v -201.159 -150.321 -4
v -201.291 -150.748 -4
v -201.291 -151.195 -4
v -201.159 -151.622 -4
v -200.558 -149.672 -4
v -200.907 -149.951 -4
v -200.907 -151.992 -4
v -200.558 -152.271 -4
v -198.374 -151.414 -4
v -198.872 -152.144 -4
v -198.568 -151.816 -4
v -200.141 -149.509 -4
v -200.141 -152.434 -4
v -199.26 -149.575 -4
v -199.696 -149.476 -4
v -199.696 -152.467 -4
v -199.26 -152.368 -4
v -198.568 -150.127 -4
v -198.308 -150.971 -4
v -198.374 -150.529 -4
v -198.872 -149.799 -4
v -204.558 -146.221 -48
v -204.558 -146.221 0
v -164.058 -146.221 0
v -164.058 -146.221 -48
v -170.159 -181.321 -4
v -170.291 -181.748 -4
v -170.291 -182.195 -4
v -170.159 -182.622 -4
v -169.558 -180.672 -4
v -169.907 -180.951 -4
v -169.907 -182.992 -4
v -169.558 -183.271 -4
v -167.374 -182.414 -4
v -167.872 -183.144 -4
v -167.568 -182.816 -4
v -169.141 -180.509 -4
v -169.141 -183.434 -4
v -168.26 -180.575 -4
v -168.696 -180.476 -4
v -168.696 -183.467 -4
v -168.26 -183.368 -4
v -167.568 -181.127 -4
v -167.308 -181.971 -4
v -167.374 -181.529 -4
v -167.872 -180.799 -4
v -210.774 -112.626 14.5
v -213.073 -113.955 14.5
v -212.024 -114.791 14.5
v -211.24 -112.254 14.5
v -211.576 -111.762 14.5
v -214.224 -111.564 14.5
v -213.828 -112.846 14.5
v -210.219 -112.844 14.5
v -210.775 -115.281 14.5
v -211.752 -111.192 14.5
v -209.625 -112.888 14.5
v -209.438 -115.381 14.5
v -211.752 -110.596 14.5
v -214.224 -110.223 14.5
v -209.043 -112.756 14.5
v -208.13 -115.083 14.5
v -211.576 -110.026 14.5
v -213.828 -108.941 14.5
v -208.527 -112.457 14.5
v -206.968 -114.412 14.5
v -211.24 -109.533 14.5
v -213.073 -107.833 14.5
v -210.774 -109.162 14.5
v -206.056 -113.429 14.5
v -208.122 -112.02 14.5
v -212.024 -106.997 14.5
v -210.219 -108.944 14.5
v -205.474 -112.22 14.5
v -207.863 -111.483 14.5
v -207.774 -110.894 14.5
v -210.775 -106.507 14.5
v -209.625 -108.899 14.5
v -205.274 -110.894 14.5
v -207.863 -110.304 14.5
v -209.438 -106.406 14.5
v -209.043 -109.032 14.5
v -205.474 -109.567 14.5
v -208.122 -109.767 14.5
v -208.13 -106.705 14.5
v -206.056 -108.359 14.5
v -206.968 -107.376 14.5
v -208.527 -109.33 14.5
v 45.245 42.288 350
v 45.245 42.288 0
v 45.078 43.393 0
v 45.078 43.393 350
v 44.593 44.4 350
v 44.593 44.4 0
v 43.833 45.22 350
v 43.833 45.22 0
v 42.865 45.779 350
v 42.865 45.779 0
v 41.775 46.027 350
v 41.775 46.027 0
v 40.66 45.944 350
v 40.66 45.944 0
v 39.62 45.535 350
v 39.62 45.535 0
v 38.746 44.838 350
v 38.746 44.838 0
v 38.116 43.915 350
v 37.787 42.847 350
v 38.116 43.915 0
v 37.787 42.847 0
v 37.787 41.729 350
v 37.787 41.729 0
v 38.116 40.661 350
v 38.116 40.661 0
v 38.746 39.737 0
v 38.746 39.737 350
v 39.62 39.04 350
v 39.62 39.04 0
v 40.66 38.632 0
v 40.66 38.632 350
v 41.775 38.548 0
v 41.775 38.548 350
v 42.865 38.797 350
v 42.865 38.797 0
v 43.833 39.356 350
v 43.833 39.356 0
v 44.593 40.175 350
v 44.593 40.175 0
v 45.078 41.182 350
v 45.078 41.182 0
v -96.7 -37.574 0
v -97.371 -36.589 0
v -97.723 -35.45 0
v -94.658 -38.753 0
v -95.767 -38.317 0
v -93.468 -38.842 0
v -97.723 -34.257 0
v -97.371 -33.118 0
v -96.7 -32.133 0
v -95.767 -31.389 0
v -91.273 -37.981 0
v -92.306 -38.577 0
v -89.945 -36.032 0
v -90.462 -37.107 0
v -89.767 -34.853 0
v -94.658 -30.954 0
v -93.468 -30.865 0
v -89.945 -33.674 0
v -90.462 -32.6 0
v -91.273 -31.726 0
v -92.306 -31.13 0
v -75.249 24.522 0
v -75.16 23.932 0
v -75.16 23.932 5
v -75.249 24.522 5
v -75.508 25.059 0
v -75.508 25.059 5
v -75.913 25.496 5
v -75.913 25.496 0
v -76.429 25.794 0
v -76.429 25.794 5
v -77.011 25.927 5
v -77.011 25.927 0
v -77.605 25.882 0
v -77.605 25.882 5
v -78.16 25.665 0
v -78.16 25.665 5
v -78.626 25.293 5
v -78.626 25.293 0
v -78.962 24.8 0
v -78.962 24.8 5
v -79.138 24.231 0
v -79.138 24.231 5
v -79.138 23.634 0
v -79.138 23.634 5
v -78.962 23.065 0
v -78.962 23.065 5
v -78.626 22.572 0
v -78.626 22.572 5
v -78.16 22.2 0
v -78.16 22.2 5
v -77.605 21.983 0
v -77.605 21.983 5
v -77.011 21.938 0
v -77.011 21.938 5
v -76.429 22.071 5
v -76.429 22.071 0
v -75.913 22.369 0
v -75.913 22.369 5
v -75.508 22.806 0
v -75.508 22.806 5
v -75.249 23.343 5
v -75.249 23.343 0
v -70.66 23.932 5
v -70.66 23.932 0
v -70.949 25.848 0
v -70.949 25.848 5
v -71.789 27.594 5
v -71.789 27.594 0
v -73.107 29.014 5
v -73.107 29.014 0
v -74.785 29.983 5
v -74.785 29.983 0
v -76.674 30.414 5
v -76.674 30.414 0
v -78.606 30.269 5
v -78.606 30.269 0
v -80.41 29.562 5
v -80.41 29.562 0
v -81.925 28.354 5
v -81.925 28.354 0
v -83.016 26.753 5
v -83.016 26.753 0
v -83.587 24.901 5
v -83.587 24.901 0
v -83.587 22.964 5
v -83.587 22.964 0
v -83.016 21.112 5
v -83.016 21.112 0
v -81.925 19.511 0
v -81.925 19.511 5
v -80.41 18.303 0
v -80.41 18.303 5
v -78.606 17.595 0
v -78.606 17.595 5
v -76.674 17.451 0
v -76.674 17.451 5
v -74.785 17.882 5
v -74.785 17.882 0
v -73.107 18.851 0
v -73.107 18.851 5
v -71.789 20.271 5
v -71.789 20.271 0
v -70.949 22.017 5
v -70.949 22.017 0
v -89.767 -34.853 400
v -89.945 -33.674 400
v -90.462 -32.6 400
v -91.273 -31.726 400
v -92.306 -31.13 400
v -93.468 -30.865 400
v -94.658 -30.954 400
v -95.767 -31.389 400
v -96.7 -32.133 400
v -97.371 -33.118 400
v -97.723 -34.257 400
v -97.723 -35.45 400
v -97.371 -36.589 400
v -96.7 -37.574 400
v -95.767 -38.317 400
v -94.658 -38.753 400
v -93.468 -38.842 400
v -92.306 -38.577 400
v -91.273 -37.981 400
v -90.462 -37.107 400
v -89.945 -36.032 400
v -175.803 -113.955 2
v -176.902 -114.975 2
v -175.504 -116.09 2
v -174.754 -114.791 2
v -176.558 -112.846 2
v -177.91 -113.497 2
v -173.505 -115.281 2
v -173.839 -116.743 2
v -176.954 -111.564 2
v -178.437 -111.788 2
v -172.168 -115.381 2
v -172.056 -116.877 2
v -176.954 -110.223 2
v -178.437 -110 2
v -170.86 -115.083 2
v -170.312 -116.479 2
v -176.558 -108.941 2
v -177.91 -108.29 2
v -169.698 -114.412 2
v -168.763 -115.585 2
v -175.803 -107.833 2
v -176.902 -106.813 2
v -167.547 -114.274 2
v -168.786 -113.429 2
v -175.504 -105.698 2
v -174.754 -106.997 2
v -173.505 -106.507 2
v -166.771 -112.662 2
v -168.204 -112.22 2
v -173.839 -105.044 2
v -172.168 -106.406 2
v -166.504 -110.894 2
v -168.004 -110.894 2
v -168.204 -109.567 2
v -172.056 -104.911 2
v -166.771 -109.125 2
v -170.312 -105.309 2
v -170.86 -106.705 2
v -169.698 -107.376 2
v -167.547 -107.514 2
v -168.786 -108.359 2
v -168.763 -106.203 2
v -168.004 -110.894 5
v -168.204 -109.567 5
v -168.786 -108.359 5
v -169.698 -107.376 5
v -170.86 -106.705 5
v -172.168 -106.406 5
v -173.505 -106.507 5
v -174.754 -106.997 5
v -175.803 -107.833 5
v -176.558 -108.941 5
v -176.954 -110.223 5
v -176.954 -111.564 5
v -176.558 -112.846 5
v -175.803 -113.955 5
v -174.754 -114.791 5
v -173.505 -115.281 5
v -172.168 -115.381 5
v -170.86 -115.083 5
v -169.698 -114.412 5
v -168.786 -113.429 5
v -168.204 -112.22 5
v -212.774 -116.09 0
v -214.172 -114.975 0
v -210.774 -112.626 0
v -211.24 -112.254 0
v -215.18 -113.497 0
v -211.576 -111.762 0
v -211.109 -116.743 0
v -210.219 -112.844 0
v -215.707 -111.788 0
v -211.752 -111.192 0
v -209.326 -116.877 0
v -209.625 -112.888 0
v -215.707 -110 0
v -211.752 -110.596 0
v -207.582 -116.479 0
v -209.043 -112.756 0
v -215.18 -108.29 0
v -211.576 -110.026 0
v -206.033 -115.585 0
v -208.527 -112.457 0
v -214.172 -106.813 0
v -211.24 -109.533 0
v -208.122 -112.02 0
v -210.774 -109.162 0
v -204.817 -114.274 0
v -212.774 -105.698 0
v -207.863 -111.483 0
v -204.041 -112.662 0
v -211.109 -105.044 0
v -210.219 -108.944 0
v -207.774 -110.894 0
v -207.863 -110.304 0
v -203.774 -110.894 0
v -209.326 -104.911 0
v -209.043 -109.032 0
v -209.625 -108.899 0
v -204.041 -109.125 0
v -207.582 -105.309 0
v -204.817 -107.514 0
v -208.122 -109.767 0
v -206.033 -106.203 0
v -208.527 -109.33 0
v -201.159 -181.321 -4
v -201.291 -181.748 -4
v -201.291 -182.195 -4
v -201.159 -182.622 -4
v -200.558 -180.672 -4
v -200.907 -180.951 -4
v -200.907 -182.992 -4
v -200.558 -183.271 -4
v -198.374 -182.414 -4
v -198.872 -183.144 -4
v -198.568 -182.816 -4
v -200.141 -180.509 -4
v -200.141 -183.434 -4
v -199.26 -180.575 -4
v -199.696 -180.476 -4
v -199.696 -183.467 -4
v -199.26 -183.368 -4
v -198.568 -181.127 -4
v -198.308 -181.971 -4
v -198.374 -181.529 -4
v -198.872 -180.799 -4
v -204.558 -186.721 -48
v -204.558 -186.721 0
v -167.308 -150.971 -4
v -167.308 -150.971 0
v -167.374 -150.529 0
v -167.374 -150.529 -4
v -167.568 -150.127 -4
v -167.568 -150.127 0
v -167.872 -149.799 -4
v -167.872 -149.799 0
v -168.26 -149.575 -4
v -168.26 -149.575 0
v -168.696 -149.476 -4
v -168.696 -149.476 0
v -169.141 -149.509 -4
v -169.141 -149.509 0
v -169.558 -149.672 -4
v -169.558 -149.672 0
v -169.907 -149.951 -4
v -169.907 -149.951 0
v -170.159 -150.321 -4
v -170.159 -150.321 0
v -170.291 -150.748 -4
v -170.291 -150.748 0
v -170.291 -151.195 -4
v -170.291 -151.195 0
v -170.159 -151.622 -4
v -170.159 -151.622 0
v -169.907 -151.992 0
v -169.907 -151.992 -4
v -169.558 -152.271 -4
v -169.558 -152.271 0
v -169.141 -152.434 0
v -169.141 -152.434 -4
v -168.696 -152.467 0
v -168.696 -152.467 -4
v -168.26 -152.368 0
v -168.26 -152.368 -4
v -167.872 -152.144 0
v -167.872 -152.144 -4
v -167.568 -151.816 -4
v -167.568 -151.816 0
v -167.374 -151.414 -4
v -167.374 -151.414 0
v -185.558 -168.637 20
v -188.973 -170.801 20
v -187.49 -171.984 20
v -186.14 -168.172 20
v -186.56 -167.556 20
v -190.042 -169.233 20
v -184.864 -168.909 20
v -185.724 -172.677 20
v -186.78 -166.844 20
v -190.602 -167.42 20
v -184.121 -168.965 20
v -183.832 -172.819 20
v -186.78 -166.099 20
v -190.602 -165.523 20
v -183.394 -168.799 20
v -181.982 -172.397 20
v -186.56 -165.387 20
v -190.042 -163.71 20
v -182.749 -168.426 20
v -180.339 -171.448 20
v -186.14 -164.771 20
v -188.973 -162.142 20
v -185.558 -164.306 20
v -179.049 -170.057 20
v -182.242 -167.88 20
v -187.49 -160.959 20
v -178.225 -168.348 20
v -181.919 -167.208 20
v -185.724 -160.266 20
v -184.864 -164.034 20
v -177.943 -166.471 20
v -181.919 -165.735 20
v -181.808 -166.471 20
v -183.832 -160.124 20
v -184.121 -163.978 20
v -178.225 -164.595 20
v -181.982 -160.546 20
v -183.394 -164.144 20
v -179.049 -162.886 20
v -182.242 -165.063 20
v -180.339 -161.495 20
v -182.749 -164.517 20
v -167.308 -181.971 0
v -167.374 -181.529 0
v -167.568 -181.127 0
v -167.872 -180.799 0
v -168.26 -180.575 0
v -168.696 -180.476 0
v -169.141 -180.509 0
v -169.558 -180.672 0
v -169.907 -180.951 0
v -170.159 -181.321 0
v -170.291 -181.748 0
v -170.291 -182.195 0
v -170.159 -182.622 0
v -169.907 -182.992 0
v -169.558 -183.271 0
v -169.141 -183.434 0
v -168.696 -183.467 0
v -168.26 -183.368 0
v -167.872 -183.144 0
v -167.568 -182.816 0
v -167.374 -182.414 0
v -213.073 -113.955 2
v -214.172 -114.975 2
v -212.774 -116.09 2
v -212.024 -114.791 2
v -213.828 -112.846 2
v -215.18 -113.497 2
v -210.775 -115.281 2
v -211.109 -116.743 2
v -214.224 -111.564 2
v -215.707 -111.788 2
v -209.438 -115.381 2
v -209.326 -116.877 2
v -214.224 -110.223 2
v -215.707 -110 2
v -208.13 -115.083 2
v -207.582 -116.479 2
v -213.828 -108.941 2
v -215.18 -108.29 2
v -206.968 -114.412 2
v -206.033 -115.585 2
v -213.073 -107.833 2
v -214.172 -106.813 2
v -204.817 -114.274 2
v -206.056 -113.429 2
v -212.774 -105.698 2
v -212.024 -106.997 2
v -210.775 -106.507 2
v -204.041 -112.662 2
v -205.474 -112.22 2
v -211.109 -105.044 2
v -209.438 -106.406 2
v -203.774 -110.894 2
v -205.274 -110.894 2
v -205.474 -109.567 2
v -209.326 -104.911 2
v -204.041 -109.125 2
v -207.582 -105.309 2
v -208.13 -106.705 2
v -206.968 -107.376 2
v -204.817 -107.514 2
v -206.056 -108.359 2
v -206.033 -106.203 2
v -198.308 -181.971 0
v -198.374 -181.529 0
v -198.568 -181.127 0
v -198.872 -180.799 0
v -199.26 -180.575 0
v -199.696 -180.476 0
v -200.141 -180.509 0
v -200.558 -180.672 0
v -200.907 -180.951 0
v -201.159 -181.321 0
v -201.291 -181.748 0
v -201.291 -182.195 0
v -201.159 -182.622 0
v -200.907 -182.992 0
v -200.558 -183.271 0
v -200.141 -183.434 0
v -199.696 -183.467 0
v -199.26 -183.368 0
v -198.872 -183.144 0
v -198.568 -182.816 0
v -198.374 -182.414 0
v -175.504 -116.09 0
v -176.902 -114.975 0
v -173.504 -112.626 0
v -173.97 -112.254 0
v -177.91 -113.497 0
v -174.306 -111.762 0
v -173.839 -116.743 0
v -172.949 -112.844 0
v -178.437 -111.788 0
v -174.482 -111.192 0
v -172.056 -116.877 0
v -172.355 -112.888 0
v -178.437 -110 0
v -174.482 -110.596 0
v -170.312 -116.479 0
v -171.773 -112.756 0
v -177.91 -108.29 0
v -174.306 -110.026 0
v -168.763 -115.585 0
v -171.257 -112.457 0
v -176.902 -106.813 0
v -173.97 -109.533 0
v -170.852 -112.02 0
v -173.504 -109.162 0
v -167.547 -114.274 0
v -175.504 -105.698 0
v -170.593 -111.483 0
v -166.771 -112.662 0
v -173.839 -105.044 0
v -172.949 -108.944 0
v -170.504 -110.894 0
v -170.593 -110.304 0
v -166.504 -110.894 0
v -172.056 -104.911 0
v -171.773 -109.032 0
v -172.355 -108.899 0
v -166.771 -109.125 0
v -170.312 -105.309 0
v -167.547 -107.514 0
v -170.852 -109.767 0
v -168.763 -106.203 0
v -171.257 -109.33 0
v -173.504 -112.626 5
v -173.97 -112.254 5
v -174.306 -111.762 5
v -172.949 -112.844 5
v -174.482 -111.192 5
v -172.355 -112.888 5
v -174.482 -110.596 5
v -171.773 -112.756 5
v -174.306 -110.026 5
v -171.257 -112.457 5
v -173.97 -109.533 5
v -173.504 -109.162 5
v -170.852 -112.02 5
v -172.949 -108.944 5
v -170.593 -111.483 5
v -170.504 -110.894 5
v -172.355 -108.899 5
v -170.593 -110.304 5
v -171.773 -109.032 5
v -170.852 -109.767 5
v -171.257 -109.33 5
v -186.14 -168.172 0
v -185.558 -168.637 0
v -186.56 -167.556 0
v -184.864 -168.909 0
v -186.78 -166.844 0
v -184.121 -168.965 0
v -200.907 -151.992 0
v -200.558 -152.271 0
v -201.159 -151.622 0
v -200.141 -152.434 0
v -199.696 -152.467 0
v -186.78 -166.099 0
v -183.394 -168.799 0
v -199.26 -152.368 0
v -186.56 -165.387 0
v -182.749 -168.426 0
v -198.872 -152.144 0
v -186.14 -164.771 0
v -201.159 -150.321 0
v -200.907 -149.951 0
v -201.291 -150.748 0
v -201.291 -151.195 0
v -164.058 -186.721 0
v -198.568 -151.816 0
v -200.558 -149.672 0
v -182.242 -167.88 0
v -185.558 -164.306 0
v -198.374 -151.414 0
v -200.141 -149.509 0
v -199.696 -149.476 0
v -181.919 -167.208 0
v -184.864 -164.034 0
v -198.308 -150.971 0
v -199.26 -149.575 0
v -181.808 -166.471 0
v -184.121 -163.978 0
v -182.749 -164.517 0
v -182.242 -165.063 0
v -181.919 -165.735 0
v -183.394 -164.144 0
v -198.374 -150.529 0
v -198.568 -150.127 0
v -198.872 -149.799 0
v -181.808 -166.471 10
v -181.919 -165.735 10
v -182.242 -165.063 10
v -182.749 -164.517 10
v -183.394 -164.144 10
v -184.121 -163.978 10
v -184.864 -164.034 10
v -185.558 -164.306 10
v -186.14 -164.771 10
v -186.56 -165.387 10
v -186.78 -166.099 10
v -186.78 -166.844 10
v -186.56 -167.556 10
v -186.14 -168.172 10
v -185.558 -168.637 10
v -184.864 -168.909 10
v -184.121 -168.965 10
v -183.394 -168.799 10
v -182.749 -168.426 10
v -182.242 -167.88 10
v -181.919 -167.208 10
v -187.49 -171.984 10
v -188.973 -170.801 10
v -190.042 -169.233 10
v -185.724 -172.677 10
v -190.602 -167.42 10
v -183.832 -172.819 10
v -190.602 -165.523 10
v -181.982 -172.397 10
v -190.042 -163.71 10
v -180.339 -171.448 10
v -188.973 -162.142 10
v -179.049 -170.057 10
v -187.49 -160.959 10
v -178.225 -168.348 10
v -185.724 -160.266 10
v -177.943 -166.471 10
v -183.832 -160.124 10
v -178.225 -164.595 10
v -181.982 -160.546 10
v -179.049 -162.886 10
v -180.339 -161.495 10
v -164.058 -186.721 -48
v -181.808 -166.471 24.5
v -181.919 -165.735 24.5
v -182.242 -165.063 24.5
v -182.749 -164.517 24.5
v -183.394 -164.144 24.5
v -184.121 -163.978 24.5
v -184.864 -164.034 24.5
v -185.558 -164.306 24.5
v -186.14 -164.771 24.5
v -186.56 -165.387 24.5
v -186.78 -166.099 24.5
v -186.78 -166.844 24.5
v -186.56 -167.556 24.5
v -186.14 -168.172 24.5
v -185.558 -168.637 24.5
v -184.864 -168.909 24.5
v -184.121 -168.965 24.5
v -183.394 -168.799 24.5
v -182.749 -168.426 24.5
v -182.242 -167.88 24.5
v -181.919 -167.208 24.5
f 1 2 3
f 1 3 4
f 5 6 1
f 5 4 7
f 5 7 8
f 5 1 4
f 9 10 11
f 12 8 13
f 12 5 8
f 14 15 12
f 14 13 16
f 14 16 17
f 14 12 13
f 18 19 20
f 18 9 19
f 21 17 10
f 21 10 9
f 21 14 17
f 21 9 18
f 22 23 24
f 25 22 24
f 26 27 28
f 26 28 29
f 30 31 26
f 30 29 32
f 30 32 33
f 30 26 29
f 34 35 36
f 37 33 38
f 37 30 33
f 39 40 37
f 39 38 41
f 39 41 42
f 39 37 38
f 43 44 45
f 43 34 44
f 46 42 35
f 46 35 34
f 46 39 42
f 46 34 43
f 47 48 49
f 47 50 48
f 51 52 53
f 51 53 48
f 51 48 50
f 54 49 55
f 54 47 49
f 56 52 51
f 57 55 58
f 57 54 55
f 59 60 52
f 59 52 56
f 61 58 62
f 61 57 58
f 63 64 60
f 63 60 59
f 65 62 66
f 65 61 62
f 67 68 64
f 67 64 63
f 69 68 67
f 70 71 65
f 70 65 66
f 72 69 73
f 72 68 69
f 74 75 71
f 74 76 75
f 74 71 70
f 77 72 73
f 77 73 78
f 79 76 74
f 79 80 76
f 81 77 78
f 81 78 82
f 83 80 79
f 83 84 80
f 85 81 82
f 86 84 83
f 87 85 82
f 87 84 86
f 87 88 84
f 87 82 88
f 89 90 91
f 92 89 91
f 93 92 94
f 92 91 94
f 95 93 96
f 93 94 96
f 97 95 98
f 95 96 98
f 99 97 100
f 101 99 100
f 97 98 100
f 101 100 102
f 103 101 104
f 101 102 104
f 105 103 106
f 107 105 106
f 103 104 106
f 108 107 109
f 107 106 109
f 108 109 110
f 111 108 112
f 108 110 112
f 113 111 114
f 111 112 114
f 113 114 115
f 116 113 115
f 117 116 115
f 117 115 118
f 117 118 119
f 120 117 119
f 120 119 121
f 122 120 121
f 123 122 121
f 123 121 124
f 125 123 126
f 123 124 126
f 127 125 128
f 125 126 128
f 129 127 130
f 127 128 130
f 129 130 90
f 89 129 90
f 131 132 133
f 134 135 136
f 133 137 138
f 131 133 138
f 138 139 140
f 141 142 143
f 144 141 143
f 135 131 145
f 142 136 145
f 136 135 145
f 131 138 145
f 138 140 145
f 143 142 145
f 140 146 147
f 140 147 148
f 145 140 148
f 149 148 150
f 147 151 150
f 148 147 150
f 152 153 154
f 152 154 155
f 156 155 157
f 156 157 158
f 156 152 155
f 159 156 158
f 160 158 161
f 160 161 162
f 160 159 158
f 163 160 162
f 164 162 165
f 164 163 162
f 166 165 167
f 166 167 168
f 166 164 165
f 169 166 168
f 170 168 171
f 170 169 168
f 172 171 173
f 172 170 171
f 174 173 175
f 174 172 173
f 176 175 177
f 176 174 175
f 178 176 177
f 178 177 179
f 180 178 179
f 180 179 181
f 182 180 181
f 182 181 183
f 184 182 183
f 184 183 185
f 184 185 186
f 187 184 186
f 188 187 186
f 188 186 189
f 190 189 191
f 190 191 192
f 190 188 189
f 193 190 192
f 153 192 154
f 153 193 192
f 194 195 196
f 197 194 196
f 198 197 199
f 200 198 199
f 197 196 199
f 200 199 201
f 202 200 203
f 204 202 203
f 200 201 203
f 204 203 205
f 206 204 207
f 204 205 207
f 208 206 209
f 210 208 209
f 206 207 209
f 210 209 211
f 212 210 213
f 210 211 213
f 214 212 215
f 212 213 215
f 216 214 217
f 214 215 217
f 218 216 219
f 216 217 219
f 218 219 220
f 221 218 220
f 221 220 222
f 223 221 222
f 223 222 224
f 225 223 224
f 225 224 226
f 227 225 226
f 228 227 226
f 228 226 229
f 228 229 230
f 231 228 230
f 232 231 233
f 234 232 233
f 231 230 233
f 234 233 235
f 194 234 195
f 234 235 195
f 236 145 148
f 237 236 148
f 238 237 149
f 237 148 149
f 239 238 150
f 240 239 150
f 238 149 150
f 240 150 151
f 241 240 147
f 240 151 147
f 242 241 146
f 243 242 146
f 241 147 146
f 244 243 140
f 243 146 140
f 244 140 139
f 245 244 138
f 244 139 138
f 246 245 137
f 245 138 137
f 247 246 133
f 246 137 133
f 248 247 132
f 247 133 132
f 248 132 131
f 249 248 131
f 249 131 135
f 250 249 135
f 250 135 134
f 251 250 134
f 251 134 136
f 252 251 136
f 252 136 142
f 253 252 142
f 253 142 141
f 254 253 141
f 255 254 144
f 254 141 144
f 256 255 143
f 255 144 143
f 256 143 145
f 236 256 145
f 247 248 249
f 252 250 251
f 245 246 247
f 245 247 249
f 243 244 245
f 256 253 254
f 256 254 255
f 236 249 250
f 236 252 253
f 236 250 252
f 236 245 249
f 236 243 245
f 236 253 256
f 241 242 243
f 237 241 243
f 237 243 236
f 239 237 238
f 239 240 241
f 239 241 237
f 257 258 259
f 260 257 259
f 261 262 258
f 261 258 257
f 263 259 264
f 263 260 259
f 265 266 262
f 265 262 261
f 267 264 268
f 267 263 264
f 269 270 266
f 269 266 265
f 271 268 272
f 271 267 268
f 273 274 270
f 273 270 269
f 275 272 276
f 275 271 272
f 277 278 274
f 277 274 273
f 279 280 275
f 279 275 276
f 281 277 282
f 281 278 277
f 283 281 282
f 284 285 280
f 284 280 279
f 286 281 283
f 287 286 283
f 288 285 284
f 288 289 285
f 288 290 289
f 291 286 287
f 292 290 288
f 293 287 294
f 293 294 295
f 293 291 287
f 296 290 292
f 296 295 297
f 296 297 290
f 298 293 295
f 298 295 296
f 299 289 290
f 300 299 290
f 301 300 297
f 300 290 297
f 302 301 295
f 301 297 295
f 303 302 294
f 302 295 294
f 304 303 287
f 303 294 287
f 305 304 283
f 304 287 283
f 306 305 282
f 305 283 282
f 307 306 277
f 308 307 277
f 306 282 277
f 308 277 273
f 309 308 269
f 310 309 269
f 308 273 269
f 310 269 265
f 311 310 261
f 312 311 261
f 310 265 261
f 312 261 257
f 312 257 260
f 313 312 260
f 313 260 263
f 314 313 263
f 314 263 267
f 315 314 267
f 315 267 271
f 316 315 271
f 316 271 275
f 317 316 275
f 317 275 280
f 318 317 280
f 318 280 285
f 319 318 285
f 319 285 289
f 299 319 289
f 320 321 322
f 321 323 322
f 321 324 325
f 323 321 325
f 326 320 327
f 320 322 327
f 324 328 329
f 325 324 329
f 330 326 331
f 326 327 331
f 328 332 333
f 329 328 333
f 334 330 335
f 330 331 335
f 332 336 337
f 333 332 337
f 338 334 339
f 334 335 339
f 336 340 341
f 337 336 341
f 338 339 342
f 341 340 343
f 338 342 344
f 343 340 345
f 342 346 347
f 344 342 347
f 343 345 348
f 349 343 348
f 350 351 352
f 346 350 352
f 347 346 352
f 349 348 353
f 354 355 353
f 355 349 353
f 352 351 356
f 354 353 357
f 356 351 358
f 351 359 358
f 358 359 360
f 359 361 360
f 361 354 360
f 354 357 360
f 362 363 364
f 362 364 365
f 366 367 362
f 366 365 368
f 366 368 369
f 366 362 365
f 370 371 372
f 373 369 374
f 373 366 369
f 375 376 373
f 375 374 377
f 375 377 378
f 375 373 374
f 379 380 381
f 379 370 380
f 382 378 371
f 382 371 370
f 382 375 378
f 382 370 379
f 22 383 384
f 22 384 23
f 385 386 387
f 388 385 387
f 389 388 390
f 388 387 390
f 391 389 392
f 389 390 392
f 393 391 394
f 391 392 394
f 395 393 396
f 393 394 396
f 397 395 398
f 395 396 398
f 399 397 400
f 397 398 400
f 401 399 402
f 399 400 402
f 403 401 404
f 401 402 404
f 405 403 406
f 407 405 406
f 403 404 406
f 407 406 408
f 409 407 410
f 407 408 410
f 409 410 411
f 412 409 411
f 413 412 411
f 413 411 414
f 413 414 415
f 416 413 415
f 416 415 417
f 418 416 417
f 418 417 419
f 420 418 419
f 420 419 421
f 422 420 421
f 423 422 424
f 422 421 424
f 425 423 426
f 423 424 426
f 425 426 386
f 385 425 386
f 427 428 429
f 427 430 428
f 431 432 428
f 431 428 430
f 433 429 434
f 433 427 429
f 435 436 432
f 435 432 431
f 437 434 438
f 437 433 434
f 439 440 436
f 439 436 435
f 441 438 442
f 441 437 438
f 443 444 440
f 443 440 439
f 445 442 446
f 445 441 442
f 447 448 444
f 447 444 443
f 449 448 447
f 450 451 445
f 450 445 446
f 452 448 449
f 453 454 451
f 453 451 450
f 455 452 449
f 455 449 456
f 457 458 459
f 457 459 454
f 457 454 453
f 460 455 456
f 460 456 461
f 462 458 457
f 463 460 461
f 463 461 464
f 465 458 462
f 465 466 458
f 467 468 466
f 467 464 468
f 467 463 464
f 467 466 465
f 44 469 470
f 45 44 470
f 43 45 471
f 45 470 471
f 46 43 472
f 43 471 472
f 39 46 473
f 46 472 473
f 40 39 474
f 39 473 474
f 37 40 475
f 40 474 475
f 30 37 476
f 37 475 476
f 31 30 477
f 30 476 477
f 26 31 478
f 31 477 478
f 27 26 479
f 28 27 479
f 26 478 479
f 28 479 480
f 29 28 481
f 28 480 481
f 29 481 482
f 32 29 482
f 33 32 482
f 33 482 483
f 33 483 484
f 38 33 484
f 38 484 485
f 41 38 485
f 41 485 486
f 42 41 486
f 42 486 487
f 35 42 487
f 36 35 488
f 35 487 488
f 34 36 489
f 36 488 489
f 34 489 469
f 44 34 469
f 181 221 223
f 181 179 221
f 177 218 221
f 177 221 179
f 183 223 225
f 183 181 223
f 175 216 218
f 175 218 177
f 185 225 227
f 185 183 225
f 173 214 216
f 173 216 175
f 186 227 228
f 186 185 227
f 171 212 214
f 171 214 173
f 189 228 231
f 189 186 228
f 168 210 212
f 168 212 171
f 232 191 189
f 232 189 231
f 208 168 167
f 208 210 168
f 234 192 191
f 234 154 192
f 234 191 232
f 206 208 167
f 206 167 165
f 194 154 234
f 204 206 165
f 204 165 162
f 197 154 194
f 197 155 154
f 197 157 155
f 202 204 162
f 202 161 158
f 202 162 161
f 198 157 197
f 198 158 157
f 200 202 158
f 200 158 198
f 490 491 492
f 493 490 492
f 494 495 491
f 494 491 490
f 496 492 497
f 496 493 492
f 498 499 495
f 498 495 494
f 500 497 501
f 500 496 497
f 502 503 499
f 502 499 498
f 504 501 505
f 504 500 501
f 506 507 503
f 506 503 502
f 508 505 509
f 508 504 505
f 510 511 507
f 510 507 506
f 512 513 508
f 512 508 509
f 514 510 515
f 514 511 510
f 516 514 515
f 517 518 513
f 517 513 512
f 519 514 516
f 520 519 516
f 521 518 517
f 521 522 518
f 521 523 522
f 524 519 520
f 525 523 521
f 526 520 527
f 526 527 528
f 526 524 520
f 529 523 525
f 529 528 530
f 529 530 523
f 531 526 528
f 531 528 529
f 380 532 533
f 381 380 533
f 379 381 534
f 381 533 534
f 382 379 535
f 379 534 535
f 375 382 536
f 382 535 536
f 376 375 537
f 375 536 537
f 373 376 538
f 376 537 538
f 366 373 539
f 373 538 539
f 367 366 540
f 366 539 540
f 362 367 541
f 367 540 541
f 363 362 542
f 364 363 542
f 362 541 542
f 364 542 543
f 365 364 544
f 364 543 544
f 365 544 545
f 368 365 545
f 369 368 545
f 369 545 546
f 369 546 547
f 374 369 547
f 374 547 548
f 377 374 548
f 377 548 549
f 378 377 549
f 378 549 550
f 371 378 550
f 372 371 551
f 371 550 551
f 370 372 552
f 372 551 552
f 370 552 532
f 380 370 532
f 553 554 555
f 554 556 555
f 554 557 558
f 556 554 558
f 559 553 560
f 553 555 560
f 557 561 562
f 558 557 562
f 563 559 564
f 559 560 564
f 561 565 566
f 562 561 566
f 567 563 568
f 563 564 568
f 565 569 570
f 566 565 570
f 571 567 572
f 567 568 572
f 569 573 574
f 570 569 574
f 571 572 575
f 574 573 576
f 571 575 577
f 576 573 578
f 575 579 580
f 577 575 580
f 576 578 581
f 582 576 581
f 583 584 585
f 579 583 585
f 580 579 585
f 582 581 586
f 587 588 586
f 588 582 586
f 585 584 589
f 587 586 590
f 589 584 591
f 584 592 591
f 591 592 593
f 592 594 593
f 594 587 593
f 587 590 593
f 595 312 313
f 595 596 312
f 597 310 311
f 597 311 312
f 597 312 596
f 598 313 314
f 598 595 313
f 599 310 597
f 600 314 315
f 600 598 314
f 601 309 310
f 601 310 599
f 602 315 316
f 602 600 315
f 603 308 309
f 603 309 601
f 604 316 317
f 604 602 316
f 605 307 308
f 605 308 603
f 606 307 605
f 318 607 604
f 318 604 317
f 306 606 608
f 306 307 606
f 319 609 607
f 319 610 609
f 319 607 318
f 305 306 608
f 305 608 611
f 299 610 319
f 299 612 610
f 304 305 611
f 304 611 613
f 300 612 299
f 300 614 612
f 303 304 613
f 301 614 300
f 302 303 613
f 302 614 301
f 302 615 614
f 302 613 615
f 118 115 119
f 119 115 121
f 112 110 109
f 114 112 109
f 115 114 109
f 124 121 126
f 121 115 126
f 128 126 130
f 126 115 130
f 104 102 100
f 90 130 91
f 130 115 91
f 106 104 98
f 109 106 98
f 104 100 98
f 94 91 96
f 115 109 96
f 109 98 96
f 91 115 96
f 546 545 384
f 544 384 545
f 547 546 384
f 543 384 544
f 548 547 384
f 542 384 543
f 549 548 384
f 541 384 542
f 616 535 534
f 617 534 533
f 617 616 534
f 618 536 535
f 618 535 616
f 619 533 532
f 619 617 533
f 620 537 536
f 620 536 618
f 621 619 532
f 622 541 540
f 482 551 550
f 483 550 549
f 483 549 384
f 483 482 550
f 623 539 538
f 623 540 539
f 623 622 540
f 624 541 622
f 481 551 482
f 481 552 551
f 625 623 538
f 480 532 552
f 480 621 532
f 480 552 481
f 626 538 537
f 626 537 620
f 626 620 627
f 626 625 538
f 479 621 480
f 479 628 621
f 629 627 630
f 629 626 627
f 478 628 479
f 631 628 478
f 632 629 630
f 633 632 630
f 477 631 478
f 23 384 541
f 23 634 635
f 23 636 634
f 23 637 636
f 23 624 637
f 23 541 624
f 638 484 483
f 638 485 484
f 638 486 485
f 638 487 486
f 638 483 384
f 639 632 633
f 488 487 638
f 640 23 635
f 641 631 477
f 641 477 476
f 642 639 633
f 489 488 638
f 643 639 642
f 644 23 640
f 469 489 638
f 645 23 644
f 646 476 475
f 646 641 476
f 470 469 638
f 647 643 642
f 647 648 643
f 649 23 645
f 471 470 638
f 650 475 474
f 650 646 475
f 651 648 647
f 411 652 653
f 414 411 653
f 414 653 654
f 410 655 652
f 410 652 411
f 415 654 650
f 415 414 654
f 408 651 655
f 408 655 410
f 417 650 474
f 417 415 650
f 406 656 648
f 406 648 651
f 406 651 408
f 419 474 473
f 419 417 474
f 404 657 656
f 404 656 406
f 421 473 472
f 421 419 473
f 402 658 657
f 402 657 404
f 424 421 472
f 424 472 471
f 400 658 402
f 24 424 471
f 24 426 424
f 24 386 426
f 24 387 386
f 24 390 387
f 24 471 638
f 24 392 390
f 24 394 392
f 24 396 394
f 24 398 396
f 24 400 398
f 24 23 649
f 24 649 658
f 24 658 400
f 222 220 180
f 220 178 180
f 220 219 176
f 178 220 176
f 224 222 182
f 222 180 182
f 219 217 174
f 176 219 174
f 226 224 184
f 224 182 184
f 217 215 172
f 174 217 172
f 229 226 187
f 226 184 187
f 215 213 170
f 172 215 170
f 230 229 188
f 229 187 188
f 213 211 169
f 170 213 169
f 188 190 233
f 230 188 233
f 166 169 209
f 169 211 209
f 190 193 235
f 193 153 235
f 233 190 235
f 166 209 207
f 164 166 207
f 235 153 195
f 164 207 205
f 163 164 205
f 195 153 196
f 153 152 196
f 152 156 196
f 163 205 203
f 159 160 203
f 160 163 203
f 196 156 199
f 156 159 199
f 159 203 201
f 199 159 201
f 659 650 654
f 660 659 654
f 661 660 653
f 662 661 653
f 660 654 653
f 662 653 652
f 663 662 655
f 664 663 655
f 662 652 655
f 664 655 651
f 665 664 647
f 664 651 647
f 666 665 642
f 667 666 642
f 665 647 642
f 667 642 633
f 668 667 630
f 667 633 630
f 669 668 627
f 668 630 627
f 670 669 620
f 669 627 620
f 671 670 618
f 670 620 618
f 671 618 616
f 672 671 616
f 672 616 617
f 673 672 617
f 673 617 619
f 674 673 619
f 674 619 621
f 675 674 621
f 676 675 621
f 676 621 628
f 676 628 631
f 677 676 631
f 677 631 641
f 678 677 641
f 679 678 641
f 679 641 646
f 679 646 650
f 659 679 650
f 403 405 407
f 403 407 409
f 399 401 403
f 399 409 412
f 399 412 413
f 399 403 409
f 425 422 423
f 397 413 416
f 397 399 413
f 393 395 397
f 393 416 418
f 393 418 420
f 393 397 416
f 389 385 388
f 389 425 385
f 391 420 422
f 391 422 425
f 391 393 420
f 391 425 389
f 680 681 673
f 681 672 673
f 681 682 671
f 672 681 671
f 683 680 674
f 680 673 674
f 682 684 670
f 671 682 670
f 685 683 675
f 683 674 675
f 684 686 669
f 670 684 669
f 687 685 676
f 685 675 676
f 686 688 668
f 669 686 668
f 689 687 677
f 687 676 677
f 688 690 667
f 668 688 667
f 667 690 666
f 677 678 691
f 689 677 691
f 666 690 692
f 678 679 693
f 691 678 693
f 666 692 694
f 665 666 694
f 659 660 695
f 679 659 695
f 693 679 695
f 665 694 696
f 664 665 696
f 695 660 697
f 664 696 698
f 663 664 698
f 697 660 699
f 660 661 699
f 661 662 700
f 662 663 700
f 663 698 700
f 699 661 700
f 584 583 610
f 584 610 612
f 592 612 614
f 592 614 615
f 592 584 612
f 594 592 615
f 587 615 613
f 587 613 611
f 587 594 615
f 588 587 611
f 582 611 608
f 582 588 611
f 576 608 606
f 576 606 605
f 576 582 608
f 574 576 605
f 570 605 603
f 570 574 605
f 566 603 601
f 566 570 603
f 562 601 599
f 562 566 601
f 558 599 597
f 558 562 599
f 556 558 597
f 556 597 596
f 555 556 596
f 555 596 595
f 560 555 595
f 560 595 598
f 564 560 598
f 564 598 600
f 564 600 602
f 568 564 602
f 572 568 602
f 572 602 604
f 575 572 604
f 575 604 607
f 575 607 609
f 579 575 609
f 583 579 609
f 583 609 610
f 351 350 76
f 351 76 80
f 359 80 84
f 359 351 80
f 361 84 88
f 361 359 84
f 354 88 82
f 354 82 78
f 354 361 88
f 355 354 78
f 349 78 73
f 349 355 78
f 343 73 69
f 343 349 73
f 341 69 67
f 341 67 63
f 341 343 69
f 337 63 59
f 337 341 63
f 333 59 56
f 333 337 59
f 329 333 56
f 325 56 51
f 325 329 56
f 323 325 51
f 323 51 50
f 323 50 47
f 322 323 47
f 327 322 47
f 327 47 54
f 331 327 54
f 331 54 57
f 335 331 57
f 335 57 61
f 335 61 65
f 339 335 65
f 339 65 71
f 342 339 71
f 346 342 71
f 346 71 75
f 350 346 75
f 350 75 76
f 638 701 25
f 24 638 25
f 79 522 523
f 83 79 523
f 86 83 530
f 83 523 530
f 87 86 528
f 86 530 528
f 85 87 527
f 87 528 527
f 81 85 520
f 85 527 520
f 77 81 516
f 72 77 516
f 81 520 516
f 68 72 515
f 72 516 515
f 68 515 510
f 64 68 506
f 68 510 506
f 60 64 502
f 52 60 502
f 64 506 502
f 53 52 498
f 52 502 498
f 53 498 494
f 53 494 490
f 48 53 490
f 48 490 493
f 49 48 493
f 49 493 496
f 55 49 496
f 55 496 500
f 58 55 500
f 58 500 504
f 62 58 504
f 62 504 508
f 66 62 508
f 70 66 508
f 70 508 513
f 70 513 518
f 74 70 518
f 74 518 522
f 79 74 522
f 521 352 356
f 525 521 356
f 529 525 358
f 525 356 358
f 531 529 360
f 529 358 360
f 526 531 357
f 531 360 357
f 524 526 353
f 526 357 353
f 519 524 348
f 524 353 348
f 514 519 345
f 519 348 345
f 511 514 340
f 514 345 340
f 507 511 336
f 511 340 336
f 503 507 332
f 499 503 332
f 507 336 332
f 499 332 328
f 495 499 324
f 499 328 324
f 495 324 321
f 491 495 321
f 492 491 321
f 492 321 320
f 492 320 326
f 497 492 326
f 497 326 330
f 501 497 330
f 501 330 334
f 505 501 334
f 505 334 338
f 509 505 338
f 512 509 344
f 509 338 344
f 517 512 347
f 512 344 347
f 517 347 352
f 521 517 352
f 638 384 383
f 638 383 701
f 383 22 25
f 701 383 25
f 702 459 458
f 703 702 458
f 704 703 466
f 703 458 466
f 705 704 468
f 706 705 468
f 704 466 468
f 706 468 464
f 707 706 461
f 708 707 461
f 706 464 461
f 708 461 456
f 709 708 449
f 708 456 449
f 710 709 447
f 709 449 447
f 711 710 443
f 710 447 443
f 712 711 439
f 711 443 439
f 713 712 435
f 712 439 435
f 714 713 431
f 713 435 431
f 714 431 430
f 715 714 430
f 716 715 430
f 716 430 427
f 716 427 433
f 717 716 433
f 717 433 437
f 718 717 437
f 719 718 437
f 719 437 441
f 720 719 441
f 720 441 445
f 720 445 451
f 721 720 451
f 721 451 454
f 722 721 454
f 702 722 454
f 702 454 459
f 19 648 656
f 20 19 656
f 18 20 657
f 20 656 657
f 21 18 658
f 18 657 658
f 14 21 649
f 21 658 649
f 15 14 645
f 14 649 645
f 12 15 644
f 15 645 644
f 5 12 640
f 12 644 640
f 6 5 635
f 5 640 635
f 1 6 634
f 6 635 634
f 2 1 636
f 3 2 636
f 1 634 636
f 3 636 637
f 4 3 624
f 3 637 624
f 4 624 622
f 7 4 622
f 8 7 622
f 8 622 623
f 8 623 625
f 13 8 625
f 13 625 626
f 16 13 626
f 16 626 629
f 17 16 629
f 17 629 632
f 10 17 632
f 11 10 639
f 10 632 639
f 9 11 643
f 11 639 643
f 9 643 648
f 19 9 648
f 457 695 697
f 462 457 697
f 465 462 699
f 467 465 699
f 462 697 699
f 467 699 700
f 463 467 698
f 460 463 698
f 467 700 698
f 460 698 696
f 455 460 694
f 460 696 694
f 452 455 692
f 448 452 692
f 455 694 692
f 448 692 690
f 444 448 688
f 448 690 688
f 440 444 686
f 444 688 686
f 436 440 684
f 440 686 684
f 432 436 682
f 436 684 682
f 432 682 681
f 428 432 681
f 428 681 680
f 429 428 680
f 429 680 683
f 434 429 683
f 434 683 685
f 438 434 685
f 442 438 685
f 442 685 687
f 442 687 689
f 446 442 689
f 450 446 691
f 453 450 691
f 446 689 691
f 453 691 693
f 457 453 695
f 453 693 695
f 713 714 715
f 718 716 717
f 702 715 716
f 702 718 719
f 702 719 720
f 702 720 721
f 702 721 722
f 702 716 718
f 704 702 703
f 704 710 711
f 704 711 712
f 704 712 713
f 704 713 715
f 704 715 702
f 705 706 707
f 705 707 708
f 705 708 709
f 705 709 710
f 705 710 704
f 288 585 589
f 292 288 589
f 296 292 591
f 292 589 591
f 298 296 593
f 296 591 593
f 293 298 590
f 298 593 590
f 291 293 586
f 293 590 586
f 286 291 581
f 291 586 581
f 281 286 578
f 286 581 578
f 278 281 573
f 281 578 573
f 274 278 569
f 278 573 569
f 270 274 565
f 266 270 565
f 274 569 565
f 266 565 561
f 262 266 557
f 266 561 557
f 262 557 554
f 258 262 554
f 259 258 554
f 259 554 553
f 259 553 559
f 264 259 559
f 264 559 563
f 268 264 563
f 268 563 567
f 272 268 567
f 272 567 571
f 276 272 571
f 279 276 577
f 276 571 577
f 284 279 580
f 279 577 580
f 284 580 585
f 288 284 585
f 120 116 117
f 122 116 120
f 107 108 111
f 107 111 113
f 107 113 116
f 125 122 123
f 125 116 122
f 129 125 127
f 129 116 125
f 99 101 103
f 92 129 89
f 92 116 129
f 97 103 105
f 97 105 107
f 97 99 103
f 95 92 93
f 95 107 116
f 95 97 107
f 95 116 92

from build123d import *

# Parameters (mm, degrees)
F0_R      = 4
F1_DEPTH  = 400
F0_R_2    = 6.5
F0_R_3    = 2
F2_DEPTH  = 5
F3_W      = 40.5
F3_H      = 40.5
F3_R      = 1.5
F3_R_2    = 6.365
F3_R_3    = 2.5
F4_DEPTH  = 48
F5_DEPTH  = 4
F6_DEPTH  = 24.5
F7_START  = 10
F7_DEPTH  = 10
F8_R      = 3.75
F9_DEPTH  = 350
F0_R_4    = 6
F0_R_5    = 4.5
F10_DEPTH = 2
F11_DEPTH = 14.5
F12_DEPTH = 5


with BuildPart() as f1:
    # F0 (on Top) → F1 (new body)
    with BuildSketch(Plane.XY):
        with Locations((-93.7674194574, -34.8533689976)):
            Circle(F0_R)
    extrude(amount=F1_DEPTH)


with BuildPart() as f2:
    # F0 (on Top) → F2 (new body)
    with BuildSketch(Plane.XY):
        with Locations((-77.1600455046, 23.9324606955)):
            Circle(F0_R_2)
        with Locations((-77.1600455046, 23.9324606955)):
            Circle(F0_R_3, mode=Mode.SUBTRACT)
    extrude(amount=F2_DEPTH)


with BuildPart() as f4:
    # F3 (on Top) → F4 (new body)
    with BuildSketch(Plane.XY):
        with Locations((-184.3076050282, -166.4714962244)):
            Rectangle(F3_W, F3_H)
        with Locations((-199.8076050282, -181.9714962244)):
            Circle(F3_R, mode=Mode.SUBTRACT)
        with Locations((-168.8076050282, -181.9714962244)):
            Circle(F3_R, mode=Mode.SUBTRACT)
        with Locations((-184.3076050282, -166.4714962244)):
            Circle(F3_R_2, mode=Mode.SUBTRACT)
        with Locations((-199.8076050282, -150.9714962244)):
            Circle(F3_R, mode=Mode.SUBTRACT)
        with Locations((-168.8076050282, -150.9714962244)):
            Circle(F3_R, mode=Mode.SUBTRACT)
        with Locations((-184.3076050282, -166.4714962244)):
            Circle(F3_R_2)
        with Locations((-184.3076050282, -166.4714962244)):
            Circle(F3_R_3, mode=Mode.SUBTRACT)
        with Locations((-184.3076050282, -166.4714962244)):
            Circle(F3_R_3)
        with Locations((-199.8076050282, -181.9714962244)):
            Circle(F3_R)
        with Locations((-199.8076050282, -150.9714962244)):
            Circle(F3_R)
        with Locations((-168.8076050282, -150.9714962244)):
            Circle(F3_R)
        with Locations((-168.8076050282, -181.9714962244)):
            Circle(F3_R)
    extrude(amount=-F4_DEPTH)

    # F3 (on Top) → F5 (cut)
    with BuildSketch(Plane.XY):
        with Locations((-199.8076050282, -150.9714962244)):
            Circle(F3_R)
        with Locations((-199.8076050282, -181.9714962244)):
            Circle(F3_R)
        with Locations((-168.8076050282, -181.9714962244)):
            Circle(F3_R)
        with Locations((-168.8076050282, -150.9714962244)):
            Circle(F3_R)
    extrude(amount=-F5_DEPTH, mode=Mode.SUBTRACT)

    # F3 (on Top) → F6 (join)
    with BuildSketch(Plane.XY):
        with Locations((-184.3076050282, -166.4714962244)):
            Circle(F3_R_3)
    extrude(amount=F6_DEPTH)

    # F3 (on Top) → F7 (join)
    with BuildSketch(Plane.XY.offset(F7_START)):
        with Locations((-184.3076050282, -166.4714962244)):
            Circle(F3_R_2)
        with Locations((-184.3076050282, -166.4714962244)):
            Circle(F3_R_3, mode=Mode.SUBTRACT)
    extrude(amount=F7_DEPTH)


with BuildPart() as f9:
    # F8 (on Top) → F9 (new body)
    with BuildSketch(Plane.XY):
        with Locations((41.4948910475, 42.2877818346)):
            Circle(F8_R)
    extrude(amount=F9_DEPTH)


with BuildPart() as f10:
    # F0 (on Top) → F10 (new body)
    with BuildSketch(Plane.XY):
        with Locations((-209.7740024328, -110.8937934041)):
            Circle(F0_R_4)
        with Locations((-209.7740024328, -110.8937934041)):
            Circle(F0_R_5, mode=Mode.SUBTRACT)
        with Locations((-209.7740024328, -110.8937934041)):
            Circle(F0_R_5)
        with Locations((-209.7740024328, -110.8937934041)):
            Circle(F0_R_3, mode=Mode.SUBTRACT)
    extrude(amount=F10_DEPTH)

    # F0 (on Top) → F11 (join)
    with BuildSketch(Plane.XY):
        with Locations((-209.7740024328, -110.8937934041)):
            Circle(F0_R_5)
        with Locations((-209.7740024328, -110.8937934041)):
            Circle(F0_R_3, mode=Mode.SUBTRACT)
    extrude(amount=F11_DEPTH)


with BuildPart() as f10b:
    # F0 (on Top) → F10, piece 2 (new body)
    with BuildSketch(Plane.XY):
        with Locations((-172.5040376186, -110.8937934041)):
            Circle(F0_R_4)
        with Locations((-172.5040376186, -110.8937934041)):
            Circle(F0_R_5, mode=Mode.SUBTRACT)
        with Locations((-172.5040376186, -110.8937934041)):
            Circle(F0_R_5)
        with Locations((-172.5040376186, -110.8937934041)):
            Circle(F0_R_3, mode=Mode.SUBTRACT)
    extrude(amount=F10_DEPTH)

    # F0 (on Top) → F12 (join)
    with BuildSketch(Plane.XY):
        with Locations((-172.5040376186, -110.8937934041)):
            Circle(F0_R_5)
        with Locations((-172.5040376186, -110.8937934041)):
            Circle(F0_R_3, mode=Mode.SUBTRACT)
    extrude(amount=F12_DEPTH)


solid = Compound([f1.part, f2.part, f4.part, f9.part, f10.part, f10b.part])
